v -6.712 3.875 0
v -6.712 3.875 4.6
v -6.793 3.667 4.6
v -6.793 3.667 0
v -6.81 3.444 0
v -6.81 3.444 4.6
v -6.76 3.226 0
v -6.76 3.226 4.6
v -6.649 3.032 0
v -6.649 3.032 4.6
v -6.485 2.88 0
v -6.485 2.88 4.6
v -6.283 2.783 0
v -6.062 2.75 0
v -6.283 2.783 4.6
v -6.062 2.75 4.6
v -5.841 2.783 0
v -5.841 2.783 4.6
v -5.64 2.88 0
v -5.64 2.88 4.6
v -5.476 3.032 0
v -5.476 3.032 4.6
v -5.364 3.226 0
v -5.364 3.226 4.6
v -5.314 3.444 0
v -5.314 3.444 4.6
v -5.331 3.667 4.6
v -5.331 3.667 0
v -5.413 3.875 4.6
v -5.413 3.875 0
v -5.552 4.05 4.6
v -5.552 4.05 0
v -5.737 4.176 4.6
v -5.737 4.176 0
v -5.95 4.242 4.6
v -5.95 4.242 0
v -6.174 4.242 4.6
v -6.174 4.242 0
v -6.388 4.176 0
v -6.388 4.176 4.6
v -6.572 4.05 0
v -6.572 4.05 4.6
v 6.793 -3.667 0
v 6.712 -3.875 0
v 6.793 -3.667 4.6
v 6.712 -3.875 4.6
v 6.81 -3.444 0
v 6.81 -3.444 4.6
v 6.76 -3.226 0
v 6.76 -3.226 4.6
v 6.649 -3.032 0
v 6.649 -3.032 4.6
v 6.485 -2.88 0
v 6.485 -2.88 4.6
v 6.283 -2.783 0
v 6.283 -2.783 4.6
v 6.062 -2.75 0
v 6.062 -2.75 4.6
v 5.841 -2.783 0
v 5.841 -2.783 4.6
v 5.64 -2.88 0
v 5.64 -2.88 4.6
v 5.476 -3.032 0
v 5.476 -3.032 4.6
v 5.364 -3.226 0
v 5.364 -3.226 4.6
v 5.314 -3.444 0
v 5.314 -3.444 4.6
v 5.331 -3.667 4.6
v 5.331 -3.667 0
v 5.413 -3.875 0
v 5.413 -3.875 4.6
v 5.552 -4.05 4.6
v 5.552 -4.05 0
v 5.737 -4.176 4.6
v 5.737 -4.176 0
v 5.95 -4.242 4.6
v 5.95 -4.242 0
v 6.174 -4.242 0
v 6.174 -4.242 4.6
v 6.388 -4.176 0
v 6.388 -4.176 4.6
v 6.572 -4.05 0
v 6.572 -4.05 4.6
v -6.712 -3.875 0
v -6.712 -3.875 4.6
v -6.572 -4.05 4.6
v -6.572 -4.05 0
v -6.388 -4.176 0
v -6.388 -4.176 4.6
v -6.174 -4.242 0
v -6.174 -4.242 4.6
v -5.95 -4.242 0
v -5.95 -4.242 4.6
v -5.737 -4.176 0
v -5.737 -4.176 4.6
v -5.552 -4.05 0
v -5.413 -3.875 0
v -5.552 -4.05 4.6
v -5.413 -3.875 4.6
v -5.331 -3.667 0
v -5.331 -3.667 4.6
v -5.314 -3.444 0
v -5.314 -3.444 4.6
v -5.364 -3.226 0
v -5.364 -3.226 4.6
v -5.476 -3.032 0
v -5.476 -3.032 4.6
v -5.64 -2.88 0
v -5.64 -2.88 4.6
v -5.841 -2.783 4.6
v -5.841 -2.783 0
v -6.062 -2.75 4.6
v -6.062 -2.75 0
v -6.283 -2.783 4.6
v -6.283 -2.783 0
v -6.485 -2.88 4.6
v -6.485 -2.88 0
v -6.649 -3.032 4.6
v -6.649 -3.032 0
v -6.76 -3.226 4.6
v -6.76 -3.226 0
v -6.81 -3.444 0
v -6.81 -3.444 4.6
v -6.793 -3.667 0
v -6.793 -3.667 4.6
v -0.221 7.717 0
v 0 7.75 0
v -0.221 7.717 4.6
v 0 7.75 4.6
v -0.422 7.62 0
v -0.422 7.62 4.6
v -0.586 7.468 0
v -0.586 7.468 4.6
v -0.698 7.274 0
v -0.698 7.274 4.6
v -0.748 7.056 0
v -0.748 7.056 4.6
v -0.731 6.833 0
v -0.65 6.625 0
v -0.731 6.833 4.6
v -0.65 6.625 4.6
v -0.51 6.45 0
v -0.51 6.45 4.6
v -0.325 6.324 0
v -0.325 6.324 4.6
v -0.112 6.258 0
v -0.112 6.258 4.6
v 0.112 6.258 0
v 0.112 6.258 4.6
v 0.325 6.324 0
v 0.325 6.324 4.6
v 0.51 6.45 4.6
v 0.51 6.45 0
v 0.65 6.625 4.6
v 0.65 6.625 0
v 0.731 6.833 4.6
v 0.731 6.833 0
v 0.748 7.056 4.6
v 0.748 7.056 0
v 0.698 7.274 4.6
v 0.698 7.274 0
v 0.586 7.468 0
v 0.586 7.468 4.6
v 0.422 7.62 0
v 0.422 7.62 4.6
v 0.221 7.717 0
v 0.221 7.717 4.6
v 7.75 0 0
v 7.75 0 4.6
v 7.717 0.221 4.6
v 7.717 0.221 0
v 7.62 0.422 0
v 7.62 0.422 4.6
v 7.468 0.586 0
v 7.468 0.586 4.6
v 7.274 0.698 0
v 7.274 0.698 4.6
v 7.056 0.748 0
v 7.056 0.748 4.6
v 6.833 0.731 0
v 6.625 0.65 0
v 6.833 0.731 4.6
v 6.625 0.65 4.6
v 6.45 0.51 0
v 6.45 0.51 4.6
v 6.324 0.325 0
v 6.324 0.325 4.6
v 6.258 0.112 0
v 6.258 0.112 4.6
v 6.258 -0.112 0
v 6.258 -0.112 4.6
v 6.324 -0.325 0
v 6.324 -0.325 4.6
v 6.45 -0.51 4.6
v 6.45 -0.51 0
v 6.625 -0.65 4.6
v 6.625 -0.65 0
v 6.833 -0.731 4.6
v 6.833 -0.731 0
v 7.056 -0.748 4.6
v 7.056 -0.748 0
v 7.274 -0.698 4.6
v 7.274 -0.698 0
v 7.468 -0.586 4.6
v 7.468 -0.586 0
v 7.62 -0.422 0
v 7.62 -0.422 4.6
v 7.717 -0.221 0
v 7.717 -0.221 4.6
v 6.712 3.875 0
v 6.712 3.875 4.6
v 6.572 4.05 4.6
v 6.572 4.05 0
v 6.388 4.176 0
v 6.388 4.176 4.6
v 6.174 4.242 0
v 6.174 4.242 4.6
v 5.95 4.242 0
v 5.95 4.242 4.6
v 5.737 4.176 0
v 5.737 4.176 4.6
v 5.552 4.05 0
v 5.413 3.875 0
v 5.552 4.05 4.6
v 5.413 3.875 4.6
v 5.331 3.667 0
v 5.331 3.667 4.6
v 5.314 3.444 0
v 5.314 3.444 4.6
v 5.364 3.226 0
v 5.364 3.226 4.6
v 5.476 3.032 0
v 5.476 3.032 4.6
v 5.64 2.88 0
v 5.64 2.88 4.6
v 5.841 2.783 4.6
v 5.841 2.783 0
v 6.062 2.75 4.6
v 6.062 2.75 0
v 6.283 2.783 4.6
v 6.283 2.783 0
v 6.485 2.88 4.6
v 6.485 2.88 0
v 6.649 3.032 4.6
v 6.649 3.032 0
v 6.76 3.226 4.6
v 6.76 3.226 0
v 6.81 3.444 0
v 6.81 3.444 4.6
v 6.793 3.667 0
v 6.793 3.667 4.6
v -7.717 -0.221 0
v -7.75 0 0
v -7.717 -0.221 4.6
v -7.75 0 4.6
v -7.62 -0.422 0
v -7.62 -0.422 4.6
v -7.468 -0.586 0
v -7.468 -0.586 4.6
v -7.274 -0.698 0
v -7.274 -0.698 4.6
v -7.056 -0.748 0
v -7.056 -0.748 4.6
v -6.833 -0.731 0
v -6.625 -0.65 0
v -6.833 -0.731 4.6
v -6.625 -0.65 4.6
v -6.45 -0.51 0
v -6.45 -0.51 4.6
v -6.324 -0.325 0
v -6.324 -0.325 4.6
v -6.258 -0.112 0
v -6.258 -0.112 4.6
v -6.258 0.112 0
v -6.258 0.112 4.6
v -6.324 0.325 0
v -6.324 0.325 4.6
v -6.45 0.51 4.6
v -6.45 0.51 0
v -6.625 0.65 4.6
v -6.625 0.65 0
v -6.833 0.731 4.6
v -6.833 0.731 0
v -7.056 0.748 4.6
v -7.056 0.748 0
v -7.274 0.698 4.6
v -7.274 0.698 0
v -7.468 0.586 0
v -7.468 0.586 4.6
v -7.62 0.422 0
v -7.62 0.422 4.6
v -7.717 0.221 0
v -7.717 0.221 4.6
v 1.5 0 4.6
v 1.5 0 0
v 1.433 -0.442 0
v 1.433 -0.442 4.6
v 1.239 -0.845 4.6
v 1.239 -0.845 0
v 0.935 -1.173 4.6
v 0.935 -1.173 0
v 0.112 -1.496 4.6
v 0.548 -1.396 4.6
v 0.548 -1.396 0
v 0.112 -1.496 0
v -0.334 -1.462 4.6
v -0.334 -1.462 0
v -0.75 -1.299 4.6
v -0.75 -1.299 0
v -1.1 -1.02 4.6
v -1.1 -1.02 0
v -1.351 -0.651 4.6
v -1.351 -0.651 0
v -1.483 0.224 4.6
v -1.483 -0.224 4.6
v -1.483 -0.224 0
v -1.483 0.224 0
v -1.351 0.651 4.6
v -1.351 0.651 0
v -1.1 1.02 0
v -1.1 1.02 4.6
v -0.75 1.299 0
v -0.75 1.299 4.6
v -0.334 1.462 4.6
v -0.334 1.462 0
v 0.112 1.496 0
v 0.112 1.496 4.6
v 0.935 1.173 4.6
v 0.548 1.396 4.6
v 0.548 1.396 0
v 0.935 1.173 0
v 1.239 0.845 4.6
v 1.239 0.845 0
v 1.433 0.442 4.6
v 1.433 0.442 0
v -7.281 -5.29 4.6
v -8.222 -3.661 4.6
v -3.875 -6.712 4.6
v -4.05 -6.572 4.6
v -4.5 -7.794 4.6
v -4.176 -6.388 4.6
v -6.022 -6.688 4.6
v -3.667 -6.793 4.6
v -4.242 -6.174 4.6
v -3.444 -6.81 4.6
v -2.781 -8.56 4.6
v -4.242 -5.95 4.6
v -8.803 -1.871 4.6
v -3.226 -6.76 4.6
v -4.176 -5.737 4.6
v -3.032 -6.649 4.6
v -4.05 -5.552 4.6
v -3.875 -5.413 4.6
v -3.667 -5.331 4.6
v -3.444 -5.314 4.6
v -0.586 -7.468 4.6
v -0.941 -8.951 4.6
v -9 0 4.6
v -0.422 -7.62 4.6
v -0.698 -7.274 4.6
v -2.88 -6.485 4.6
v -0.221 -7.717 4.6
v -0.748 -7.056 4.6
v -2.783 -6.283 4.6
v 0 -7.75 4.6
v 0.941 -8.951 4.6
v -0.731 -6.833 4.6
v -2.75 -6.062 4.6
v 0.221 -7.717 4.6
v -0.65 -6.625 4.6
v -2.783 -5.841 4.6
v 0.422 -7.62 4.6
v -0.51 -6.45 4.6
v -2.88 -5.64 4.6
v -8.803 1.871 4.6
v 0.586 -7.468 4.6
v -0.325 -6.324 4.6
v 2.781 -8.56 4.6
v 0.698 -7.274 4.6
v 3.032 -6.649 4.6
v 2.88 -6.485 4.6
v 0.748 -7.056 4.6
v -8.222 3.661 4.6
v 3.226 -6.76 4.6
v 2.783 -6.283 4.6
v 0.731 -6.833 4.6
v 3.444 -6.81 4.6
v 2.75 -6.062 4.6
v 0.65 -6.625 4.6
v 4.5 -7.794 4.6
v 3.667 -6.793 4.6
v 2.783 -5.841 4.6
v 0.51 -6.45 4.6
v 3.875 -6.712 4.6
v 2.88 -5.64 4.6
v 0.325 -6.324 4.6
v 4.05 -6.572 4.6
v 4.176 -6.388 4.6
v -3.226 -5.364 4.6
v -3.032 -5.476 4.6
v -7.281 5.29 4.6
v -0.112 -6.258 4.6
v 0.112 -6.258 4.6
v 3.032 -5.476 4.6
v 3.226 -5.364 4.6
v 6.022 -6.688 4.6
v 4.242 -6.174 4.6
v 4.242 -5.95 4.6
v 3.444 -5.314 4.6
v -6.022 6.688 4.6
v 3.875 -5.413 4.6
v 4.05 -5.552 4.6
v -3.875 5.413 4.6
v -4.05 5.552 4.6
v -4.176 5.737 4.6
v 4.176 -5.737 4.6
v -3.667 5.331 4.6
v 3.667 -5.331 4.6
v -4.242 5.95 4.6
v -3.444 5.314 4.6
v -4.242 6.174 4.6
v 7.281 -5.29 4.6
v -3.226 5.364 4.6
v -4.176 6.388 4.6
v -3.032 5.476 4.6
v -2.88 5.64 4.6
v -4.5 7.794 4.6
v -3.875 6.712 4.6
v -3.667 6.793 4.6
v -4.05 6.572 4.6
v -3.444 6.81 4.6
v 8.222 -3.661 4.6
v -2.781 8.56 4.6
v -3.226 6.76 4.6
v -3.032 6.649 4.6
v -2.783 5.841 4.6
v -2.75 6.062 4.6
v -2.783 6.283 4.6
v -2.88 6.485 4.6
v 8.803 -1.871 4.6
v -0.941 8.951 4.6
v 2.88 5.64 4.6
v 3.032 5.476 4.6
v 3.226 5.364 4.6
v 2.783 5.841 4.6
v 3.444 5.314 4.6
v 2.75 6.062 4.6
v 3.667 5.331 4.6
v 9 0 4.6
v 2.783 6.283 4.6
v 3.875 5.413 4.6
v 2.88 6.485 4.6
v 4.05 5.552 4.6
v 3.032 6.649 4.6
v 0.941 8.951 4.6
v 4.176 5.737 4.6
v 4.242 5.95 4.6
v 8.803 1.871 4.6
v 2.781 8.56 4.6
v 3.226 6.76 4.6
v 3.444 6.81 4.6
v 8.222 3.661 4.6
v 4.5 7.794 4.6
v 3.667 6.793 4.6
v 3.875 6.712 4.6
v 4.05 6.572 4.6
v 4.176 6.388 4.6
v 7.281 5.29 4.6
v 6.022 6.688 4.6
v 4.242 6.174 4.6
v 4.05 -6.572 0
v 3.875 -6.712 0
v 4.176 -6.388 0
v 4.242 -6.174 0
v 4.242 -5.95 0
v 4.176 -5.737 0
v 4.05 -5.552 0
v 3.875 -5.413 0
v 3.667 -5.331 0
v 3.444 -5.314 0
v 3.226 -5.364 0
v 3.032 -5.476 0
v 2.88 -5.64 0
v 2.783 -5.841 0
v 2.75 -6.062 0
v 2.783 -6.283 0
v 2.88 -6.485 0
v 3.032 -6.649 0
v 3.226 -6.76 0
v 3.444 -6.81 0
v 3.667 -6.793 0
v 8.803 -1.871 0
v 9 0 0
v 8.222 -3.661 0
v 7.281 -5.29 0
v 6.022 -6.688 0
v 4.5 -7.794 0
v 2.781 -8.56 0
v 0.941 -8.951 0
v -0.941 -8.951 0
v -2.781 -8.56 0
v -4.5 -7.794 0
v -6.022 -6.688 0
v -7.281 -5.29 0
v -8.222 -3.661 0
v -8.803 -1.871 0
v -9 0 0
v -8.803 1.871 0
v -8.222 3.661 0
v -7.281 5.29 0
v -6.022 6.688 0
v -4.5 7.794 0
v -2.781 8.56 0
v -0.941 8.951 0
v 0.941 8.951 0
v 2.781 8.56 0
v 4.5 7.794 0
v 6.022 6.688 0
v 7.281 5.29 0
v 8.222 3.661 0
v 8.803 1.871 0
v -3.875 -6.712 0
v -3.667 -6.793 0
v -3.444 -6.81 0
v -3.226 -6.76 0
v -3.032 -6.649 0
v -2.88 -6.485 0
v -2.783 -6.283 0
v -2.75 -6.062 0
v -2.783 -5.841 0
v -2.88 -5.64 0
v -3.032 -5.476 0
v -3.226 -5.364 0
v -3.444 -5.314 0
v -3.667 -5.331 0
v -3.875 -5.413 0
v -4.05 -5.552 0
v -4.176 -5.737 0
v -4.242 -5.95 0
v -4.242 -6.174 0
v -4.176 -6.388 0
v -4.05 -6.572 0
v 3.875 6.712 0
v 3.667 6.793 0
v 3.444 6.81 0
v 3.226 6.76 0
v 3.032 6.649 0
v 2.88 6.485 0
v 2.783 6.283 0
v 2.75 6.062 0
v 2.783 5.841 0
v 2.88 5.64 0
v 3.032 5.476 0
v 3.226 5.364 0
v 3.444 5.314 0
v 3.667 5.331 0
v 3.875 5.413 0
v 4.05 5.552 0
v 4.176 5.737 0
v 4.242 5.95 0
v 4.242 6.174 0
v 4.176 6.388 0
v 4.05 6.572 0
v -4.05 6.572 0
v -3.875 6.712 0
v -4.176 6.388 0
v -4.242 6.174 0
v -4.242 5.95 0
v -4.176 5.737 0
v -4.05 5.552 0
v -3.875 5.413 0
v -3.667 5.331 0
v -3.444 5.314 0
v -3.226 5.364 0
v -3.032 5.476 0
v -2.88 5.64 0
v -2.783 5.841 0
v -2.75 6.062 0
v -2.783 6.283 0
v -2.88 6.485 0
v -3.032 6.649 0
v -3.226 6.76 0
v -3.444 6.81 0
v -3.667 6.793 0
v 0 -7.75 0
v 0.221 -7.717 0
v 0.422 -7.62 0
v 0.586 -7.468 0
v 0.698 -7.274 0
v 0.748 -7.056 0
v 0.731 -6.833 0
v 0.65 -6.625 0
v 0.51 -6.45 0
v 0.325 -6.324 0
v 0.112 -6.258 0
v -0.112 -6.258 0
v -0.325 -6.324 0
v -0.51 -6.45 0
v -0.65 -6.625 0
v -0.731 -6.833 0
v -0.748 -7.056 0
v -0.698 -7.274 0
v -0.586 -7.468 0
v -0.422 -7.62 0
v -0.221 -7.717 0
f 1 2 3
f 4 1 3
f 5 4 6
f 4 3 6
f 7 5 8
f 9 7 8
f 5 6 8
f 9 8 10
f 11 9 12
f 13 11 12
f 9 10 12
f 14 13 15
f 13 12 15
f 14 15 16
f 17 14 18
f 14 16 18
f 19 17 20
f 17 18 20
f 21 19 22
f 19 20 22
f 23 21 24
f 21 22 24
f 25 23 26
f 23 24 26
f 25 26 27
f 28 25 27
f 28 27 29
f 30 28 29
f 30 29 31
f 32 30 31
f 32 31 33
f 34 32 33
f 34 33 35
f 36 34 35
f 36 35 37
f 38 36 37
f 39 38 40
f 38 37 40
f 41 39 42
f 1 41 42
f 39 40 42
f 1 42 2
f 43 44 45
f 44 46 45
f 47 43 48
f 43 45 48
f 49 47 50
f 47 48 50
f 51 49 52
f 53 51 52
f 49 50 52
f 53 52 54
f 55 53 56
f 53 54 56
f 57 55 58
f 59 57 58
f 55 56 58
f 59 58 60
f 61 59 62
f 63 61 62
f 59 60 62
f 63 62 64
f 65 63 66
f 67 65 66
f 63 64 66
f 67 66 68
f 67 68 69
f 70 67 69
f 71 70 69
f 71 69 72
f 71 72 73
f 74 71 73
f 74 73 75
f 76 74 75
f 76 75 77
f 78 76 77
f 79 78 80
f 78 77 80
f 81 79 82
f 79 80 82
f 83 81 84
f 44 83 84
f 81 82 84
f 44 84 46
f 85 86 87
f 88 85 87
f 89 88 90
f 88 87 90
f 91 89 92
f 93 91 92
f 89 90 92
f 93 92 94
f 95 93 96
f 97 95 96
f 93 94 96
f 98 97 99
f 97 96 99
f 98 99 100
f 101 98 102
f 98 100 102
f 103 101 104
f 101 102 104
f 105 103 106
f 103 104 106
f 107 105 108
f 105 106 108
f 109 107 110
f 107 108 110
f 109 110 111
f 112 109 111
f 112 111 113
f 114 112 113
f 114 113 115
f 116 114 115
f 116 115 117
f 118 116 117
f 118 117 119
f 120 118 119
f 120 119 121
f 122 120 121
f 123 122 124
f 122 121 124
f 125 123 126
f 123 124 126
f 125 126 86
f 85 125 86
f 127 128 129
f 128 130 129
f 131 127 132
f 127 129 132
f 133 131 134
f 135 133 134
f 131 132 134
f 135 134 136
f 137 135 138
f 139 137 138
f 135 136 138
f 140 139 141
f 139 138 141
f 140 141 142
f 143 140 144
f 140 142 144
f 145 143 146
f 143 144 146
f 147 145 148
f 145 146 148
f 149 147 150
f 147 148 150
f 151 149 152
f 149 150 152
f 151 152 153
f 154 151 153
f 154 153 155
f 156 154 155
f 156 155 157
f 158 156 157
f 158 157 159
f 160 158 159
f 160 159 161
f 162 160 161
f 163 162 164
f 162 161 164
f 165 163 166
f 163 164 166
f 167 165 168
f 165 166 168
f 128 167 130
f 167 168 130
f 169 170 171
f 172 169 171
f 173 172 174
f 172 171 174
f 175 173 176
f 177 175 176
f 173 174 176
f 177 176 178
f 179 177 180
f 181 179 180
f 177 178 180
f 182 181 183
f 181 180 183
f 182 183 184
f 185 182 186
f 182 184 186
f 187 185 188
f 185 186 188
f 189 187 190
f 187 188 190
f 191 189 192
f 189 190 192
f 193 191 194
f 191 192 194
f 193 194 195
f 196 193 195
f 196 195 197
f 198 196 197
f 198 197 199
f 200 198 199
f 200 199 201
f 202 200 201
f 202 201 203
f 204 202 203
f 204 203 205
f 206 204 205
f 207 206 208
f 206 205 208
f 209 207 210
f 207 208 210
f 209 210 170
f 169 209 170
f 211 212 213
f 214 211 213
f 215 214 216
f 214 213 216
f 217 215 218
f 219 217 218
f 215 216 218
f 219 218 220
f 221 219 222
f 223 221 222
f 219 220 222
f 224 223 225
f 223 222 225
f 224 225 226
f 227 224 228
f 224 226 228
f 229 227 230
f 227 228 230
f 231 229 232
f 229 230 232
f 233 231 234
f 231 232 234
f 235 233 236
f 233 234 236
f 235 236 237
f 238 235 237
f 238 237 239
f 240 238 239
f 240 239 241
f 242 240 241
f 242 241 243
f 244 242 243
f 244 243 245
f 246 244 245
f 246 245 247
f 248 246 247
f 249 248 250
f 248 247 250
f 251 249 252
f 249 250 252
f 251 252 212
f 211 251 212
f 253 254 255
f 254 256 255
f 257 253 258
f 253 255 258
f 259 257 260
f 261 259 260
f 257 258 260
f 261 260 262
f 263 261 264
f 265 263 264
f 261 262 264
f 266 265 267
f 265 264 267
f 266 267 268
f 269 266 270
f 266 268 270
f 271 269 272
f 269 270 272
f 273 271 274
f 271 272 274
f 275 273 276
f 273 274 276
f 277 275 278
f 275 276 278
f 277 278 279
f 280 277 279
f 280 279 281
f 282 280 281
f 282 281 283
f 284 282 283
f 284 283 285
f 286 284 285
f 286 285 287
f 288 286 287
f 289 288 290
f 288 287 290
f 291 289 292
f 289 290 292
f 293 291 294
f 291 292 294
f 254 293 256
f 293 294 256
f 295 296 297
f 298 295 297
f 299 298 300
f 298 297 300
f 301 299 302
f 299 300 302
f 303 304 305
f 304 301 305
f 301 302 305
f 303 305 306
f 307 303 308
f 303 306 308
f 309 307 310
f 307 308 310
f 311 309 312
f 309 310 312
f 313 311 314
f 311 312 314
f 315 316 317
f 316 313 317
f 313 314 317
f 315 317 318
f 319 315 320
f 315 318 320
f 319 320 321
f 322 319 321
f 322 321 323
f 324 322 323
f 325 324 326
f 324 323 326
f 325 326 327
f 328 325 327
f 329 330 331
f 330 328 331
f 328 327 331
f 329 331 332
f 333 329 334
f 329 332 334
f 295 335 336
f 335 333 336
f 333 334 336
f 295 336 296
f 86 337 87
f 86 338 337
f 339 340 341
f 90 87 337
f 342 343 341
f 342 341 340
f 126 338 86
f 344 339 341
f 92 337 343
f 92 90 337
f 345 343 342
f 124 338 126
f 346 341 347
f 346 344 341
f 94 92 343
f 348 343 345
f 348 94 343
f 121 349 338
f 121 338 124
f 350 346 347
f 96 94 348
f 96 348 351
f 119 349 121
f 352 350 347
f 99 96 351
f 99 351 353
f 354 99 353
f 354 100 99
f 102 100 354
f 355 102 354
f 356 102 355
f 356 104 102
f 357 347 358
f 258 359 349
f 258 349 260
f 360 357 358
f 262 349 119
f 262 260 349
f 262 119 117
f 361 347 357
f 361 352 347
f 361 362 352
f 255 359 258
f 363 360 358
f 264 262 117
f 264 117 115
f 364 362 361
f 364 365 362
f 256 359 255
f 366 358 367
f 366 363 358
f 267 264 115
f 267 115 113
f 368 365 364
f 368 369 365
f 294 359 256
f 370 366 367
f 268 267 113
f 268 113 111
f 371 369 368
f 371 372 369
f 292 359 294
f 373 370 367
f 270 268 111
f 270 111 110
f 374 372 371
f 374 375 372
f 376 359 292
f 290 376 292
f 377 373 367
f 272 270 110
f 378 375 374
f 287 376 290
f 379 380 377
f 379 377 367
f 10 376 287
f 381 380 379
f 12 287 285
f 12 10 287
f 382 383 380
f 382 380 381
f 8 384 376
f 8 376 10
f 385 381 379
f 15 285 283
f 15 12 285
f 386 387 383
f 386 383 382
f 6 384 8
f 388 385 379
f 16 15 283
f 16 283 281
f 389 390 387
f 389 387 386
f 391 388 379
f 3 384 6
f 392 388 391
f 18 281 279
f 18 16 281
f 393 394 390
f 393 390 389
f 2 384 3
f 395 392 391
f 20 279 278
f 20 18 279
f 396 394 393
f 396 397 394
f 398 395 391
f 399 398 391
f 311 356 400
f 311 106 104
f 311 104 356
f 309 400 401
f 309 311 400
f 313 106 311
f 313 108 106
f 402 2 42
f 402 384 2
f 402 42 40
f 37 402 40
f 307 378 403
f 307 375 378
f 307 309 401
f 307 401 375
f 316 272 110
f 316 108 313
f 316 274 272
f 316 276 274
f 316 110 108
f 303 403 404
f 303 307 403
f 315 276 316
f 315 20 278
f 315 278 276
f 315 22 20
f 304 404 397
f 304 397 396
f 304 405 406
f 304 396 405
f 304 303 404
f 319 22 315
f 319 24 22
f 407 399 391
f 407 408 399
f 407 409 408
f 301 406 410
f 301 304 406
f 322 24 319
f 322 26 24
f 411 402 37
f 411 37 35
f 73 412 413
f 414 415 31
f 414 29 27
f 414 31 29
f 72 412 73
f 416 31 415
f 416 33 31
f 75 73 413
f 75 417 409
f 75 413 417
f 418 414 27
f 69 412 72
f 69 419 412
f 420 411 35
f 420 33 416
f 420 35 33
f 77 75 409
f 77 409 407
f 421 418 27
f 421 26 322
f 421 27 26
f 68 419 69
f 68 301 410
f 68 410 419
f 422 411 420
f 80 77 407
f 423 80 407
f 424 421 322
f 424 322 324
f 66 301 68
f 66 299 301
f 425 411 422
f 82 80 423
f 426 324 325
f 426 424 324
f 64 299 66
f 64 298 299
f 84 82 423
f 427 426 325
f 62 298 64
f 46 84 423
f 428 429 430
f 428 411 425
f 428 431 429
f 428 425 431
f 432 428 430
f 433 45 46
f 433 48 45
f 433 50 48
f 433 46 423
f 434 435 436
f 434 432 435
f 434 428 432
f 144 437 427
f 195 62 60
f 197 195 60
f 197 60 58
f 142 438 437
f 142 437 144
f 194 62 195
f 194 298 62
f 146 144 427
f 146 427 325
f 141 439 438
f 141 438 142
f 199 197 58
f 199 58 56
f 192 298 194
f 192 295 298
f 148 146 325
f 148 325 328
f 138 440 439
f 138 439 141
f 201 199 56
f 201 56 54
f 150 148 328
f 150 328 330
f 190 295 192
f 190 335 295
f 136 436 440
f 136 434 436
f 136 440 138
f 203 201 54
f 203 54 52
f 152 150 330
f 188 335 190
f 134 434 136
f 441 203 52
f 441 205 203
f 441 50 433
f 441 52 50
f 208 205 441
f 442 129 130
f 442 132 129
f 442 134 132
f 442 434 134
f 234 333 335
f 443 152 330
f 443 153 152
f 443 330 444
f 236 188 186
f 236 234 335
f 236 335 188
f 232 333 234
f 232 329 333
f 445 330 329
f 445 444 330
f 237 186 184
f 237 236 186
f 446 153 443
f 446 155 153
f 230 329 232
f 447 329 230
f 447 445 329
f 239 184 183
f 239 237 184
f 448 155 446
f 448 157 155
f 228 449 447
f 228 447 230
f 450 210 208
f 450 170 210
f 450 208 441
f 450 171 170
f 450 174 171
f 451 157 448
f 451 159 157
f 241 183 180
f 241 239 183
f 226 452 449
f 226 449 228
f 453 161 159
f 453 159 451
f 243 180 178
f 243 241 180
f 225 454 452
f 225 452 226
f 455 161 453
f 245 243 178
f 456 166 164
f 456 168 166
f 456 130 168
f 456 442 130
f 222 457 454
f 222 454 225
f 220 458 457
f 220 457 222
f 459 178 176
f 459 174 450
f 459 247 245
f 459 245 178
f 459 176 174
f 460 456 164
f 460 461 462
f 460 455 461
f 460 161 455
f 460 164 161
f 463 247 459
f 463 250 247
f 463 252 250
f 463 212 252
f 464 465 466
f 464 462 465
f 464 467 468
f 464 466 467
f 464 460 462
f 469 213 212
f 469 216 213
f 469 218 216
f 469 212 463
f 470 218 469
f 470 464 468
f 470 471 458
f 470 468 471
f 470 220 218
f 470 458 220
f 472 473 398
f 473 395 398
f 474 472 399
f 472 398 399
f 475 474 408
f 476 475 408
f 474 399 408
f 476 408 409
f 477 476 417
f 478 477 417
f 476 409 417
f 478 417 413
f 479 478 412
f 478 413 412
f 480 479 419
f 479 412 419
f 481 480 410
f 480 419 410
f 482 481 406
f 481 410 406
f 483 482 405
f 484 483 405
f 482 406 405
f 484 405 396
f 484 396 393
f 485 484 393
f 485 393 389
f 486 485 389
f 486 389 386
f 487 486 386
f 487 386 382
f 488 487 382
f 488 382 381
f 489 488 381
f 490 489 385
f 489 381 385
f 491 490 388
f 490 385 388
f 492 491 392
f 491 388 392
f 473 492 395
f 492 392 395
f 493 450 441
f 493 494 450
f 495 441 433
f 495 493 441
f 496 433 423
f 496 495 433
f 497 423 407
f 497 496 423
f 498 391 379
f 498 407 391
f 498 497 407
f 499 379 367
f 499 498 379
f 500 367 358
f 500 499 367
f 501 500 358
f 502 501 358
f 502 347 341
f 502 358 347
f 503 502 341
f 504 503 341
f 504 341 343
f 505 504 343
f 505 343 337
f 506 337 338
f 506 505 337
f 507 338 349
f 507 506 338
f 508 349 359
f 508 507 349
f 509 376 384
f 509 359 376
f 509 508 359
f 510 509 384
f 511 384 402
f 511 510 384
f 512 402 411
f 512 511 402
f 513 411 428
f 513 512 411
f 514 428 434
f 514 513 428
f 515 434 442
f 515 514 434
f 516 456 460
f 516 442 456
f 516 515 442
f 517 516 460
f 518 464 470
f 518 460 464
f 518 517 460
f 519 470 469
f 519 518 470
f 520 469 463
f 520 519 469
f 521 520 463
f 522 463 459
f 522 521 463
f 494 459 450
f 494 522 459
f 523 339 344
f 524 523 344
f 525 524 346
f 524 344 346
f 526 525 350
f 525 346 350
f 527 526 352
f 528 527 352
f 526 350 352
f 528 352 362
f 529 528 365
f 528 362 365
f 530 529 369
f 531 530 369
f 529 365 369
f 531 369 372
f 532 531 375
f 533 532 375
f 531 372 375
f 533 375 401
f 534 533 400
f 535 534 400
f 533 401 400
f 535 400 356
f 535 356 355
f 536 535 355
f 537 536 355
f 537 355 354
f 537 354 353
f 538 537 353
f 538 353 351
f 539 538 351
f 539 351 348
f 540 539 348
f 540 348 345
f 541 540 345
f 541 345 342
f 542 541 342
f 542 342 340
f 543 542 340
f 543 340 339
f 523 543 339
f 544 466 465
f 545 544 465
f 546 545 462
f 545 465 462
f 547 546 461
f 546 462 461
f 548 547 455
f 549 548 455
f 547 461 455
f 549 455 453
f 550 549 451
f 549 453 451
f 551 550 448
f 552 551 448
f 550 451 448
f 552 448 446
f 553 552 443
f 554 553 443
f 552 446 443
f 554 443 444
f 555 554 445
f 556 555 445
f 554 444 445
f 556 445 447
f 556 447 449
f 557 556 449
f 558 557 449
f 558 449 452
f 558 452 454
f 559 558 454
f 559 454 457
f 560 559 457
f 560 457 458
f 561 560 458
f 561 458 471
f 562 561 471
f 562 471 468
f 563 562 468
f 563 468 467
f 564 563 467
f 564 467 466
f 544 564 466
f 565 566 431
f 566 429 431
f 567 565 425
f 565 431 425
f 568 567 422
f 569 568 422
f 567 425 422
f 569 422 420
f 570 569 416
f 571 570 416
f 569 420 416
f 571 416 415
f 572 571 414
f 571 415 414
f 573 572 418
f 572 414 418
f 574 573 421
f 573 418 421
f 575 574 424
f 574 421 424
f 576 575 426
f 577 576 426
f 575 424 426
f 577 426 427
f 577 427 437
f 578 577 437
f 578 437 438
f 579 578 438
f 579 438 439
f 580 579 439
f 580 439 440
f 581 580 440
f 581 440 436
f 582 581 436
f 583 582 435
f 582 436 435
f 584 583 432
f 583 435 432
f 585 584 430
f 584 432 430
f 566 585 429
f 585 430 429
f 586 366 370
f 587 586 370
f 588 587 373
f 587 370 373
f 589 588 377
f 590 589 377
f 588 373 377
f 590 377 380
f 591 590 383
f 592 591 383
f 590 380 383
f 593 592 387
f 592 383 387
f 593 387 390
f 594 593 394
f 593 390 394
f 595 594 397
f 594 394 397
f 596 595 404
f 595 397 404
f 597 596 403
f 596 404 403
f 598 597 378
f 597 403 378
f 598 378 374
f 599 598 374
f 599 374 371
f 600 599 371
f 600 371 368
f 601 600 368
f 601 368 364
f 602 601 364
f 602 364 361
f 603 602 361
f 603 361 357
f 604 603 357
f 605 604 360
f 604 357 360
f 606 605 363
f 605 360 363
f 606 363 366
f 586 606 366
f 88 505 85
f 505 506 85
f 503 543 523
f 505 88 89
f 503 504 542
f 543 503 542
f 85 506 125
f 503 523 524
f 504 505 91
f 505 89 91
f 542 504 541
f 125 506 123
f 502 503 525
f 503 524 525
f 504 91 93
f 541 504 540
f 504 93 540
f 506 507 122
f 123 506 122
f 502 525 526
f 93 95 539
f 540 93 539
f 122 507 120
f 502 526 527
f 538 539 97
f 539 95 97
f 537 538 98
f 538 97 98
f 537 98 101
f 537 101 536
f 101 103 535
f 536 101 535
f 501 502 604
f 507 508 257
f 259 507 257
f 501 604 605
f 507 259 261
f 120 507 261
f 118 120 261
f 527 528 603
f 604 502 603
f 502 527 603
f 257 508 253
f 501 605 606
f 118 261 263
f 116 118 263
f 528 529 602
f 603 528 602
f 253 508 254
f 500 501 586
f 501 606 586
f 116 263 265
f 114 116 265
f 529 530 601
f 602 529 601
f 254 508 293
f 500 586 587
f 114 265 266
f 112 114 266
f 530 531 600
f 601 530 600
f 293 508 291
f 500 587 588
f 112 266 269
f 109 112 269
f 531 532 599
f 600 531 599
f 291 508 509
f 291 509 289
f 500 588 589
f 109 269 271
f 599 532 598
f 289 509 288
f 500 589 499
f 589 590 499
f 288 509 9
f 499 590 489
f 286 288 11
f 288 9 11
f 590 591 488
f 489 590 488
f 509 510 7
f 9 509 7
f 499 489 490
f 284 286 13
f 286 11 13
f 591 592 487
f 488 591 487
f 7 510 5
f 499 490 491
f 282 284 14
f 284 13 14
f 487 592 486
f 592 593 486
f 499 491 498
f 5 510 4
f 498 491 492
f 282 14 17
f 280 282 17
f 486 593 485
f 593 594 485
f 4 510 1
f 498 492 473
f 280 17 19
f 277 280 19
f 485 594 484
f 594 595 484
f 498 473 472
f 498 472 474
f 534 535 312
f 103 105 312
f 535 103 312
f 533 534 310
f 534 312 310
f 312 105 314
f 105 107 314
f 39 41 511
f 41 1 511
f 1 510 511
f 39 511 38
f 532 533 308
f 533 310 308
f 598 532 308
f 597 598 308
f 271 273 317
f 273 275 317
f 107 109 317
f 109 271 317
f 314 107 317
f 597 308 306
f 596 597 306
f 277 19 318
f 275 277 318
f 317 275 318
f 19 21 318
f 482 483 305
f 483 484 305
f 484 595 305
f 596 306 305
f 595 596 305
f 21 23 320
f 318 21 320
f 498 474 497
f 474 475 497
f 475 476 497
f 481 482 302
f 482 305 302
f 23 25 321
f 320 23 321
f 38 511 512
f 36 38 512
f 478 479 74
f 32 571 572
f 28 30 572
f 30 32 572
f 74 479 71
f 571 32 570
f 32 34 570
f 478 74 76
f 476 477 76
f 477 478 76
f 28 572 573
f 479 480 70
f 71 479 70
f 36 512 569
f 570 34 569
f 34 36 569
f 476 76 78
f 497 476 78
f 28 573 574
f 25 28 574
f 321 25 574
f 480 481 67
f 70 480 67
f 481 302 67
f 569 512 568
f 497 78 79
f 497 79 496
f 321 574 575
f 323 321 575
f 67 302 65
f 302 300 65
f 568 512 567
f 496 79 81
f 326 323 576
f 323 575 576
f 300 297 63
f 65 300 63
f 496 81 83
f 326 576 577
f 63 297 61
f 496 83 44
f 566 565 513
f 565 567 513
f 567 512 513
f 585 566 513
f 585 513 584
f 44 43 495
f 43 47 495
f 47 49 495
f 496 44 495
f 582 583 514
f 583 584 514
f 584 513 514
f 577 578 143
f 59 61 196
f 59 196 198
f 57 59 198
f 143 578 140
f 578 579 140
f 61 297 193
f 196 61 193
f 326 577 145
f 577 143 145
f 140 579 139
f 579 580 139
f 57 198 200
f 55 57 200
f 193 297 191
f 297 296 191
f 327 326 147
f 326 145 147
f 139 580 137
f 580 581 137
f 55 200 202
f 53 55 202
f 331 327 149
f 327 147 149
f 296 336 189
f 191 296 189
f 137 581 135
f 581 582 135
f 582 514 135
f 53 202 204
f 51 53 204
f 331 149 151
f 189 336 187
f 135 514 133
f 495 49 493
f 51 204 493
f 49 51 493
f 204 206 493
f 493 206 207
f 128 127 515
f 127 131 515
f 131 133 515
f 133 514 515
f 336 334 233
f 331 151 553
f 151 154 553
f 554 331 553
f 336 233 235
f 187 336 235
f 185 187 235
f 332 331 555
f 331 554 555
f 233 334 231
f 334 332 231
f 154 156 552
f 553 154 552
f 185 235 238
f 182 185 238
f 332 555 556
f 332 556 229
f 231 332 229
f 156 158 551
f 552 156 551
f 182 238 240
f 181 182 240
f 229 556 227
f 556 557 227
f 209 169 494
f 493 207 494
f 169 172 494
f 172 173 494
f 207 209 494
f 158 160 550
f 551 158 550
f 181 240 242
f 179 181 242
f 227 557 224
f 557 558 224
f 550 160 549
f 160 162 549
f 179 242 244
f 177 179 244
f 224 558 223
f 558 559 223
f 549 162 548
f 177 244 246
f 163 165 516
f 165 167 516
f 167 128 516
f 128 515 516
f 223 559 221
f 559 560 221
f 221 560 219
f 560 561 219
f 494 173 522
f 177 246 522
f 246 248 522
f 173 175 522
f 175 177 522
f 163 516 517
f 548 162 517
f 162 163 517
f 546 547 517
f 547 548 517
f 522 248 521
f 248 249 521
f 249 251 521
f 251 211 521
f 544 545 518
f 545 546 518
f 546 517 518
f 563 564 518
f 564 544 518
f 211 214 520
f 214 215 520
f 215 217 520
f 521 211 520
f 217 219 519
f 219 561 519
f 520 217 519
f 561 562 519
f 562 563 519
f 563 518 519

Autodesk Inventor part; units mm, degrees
ref_plane "YZ Plane" through (0, 0, 0) normal (1, 0, 0) x (0, 1, 0)
ref_plane "XZ Plane" through (0, 0, 0) normal (0, 1, 0) x (-1, 0, 0)
ref_plane "XY Plane" through (0, 0, 0) normal (0, 0, 1) x (1, 0, 0)
sketch "Sketch1" plane through (0, 0, 0) normal (0, 0, 1) x (1, 0, 0)
  circle A0 centre (0, 0) radius 9
  circle A1 centre (0, 0) radius 1.5
  dimension "d0" = 18
  dimension "d1" = 3
extrude "Extrusion1" add sketch "Sketch1" along normal blind 4.6
sketch "Sketch2" plane through (0, 0, 4.6) normal (0, 0, 1) x (1, 0, 0)
  circle A0 centre (7, 0) radius 0.75
  point P0 (0, 0)
  dimension "d4" = 7
  dimension "d5" = 1.5
extrude "Extrusion2" cut sketch "Sketch2" against normal blind 5
pattern_circular "Circular Pattern1" count 12 over 360 about axis through (0, 0, 0) along (0, 0, 1) of "Extrusion2"
properties part number "herkulex spinner"
